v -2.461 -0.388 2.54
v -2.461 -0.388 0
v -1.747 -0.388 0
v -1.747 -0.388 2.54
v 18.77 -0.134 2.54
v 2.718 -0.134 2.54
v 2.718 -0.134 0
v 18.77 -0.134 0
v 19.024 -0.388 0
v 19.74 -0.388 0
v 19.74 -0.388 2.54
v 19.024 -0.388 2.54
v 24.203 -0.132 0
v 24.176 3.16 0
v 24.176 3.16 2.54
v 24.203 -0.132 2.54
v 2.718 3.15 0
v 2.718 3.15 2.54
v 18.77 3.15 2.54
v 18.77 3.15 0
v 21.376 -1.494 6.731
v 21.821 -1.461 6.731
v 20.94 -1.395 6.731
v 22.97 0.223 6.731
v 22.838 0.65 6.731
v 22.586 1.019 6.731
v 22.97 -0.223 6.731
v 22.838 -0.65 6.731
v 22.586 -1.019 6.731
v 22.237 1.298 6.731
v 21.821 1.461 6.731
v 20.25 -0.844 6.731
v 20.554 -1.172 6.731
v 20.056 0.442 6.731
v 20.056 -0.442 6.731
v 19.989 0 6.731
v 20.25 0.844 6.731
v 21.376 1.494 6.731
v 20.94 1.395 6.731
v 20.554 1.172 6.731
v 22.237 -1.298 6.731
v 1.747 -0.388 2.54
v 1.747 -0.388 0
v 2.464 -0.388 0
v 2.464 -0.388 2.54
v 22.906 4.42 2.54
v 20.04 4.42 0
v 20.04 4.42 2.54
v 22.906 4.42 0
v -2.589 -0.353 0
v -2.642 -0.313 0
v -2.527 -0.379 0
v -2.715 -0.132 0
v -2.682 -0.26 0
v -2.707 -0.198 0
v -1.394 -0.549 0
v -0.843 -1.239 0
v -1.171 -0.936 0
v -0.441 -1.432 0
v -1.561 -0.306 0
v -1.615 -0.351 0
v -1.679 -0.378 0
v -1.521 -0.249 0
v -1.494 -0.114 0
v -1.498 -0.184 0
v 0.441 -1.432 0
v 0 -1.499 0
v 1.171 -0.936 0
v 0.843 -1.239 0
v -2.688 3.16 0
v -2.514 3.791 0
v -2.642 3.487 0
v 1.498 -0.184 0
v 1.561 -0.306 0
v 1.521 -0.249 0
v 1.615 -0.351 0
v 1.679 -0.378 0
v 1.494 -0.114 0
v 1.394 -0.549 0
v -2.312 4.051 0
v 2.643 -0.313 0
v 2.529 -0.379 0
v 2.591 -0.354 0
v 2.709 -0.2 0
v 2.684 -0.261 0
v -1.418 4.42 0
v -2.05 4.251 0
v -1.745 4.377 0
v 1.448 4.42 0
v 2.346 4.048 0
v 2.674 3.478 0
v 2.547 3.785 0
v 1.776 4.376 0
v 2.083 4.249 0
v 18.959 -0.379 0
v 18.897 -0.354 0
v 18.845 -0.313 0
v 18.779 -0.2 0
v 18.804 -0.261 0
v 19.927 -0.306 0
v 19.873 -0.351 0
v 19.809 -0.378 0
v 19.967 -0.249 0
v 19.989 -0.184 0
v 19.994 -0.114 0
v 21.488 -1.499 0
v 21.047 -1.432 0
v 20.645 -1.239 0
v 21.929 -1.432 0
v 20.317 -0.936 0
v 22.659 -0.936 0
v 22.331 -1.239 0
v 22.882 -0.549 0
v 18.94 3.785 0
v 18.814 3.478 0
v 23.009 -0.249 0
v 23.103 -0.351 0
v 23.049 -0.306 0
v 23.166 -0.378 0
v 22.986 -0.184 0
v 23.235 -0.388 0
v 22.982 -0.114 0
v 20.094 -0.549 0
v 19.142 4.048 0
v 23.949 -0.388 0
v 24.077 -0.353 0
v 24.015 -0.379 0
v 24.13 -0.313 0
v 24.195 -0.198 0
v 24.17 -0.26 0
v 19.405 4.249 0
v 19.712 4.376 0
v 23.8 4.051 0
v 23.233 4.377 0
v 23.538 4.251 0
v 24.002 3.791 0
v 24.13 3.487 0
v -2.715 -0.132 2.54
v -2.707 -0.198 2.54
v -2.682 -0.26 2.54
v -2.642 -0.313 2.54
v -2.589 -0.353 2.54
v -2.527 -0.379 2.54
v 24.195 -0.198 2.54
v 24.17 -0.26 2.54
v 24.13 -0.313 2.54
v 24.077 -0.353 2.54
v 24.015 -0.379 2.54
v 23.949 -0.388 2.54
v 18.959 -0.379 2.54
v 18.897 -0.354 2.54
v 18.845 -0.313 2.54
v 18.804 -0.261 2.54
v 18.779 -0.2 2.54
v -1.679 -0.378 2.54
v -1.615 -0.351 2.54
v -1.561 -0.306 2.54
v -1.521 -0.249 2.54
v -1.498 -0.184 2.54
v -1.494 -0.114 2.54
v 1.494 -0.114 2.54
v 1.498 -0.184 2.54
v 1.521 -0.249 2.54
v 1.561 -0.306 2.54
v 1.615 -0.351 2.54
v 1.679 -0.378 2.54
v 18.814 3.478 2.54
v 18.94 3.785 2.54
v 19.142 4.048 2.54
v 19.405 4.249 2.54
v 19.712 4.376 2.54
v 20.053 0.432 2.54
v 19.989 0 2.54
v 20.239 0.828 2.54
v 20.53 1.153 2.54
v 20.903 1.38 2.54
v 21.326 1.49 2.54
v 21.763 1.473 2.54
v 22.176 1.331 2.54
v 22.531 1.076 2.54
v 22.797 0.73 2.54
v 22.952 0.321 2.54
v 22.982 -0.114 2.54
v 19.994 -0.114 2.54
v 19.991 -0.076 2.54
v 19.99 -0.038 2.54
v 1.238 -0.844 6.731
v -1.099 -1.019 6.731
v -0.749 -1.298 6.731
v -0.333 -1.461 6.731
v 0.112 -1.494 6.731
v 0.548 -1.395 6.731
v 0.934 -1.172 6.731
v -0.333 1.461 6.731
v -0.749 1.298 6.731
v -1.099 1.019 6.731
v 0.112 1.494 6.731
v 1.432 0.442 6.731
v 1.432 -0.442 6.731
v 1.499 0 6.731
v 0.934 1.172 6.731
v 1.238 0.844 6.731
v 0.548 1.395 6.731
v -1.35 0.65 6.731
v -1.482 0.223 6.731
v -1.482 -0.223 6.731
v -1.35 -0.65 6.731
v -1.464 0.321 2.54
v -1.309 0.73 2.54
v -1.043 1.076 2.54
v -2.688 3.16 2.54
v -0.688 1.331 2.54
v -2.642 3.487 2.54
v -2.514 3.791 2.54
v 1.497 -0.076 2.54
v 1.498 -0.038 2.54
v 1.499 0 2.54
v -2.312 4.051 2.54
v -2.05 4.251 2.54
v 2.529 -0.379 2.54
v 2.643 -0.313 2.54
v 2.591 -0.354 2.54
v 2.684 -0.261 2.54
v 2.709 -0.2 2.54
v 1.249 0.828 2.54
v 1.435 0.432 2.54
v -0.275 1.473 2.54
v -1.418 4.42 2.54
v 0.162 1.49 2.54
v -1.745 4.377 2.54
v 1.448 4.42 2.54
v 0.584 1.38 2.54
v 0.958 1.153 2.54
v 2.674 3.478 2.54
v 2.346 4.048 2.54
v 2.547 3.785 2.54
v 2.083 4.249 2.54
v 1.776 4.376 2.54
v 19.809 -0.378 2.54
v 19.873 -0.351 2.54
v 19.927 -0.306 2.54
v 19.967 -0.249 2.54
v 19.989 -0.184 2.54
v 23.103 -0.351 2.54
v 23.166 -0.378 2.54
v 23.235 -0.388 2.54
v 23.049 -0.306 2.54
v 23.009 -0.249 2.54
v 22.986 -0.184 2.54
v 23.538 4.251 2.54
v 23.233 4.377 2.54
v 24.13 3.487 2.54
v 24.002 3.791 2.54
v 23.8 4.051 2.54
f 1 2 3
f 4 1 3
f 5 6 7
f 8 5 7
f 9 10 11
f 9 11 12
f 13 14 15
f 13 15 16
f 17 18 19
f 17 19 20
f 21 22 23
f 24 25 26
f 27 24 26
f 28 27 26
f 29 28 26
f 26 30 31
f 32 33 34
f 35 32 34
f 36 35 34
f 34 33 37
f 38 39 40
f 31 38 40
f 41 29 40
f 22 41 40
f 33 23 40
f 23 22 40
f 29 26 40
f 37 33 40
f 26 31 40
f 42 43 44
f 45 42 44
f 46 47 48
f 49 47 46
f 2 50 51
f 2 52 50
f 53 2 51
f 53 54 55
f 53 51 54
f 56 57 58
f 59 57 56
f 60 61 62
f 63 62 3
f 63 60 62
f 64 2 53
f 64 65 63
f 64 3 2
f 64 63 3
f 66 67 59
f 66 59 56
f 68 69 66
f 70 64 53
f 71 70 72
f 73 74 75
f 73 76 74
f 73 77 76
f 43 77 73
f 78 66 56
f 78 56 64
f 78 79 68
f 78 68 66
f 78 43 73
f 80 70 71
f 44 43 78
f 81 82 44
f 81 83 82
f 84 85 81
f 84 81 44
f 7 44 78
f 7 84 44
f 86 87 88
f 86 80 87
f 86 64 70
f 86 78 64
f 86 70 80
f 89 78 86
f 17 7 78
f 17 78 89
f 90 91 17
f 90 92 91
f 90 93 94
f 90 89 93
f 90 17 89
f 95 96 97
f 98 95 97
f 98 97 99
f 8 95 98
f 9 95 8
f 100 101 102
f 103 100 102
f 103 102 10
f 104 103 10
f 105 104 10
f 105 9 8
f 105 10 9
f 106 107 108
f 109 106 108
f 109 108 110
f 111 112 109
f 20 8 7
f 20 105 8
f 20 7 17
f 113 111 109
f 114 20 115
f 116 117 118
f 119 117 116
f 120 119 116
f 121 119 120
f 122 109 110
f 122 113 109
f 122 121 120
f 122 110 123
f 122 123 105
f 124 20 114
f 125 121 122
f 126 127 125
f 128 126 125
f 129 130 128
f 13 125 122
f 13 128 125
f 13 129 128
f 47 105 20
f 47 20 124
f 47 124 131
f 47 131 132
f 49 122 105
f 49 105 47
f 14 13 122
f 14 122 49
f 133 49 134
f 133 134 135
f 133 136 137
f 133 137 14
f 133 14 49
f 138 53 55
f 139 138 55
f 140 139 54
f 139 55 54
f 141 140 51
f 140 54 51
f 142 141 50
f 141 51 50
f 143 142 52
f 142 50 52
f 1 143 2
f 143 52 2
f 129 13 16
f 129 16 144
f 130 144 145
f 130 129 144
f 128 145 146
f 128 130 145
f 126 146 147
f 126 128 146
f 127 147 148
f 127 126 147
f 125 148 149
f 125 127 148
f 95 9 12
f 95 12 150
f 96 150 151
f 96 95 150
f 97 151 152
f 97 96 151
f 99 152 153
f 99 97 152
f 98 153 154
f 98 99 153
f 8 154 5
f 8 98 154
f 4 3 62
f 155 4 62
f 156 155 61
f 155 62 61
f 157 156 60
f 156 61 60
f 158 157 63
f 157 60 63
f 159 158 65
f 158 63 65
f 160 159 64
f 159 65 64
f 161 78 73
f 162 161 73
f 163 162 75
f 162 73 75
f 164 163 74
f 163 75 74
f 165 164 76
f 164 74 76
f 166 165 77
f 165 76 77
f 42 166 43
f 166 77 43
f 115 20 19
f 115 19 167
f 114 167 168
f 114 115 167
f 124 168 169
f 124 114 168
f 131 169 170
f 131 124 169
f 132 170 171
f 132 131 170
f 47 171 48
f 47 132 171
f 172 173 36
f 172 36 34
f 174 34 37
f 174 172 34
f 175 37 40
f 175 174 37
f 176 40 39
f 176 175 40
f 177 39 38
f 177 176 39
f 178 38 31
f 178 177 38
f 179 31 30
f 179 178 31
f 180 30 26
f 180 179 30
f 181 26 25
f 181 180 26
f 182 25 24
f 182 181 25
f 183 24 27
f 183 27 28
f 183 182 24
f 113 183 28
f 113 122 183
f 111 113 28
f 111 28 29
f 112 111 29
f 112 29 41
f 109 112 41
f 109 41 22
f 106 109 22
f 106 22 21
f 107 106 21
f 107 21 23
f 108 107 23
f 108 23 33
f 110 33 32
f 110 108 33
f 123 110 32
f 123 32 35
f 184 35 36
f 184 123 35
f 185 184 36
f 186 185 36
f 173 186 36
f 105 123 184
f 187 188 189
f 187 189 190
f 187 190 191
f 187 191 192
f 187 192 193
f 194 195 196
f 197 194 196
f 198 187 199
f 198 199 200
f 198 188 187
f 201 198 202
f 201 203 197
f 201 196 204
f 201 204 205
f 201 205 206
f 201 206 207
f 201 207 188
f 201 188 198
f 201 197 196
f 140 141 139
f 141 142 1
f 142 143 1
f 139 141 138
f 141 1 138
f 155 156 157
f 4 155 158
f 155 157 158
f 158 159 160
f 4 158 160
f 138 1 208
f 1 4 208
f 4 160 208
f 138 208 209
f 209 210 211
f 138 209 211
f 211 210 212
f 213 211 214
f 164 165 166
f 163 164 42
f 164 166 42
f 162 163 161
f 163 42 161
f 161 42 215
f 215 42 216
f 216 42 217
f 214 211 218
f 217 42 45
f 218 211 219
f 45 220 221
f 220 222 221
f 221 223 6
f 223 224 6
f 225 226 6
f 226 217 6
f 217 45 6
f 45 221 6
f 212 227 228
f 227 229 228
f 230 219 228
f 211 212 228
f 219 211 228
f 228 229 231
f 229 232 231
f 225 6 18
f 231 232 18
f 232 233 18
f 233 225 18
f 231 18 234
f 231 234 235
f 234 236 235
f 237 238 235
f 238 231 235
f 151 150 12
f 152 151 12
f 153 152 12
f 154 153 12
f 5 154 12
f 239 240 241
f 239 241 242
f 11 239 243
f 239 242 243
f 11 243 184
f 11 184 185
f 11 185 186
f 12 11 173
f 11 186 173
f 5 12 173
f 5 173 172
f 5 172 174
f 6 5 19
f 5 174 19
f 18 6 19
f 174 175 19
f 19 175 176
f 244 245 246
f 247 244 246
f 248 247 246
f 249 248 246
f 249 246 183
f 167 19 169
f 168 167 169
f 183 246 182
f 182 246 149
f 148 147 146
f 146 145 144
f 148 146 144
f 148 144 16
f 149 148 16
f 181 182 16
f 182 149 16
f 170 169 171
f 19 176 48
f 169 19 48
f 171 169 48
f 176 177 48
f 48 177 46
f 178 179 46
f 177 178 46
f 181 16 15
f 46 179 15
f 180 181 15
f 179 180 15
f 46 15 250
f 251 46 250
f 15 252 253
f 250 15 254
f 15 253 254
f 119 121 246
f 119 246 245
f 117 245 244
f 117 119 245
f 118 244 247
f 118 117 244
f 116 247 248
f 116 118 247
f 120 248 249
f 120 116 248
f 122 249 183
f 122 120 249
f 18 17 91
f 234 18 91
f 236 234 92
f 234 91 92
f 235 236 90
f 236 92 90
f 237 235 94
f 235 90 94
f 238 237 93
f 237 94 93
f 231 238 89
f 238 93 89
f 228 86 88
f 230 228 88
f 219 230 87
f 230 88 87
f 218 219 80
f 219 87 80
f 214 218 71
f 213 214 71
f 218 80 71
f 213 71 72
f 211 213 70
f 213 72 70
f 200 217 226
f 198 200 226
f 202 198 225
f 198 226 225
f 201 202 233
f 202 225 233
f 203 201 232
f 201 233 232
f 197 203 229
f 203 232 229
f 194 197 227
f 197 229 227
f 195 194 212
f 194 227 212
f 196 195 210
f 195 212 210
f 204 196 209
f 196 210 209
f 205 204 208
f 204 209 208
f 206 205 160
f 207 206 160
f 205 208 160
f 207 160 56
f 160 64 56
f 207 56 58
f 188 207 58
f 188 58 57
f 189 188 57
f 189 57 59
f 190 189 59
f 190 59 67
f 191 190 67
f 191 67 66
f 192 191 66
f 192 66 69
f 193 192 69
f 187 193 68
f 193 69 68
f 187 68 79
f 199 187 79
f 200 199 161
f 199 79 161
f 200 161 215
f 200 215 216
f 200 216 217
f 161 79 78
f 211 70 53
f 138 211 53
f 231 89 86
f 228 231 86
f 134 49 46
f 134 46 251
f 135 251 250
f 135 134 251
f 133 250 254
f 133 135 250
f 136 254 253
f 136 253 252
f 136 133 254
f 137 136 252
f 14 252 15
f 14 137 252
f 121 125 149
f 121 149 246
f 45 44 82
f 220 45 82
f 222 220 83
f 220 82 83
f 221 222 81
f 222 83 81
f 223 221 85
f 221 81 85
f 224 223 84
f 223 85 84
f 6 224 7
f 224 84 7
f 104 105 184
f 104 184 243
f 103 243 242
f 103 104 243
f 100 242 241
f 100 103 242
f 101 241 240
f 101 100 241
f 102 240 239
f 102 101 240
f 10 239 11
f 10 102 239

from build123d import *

# Parameters (mm, degrees)
SKETCH1_R           = 1.4986
BOSS_EXTRUDE1_DEPTH = 6.731
BOSS_EXTRUDE2_DEPTH = 2.54
SKETCH3_W           = 2.54
SKETCH3_H           = 3.283466221
BOSS_EXTRUDE3_DEPTH = 8.0264


with BuildPart() as part:
    # Sketch1 → Boss-Extrude1 (new body)
    with BuildSketch(Plane.XY):
        Circle(SKETCH1_R)
    extrude(amount=BOSS_EXTRUDE1_DEPTH)

    # Sketch2 → Boss-Extrude2 (add)
    with BuildSketch(Plane(origin=(0, 0, 0), x_dir=(-1, 0, 0), z_dir=(0, 0, -1))):
        with BuildLine():
            Line((-1.74748007, -0.387866221), (-2.463536443, -0.387866221))
            ThreePointArc((-2.463536443, -0.387866221), (-2.643141566, -0.313471343), (-2.717536443, -0.133866221))
            Line((-2.717536443, -0.133866221), (-2.717536443, 3.1496))
            ThreePointArc((-2.717536443, 3.1496), (-2.345562055, 4.047625612), (-1.447536443, 4.4196))
            Line((-1.447536443, 4.4196), (1.417916008, 4.4196))
            ThreePointArc((1.417916008, 4.4196), (2.312179766, 4.051371774), (2.687871622, 3.160217845))
            Line((2.687871622, 3.160217845), (2.715395045, -0.131742652))
            ThreePointArc((2.715395045, -0.131742652), (2.641758277, -0.312718973), (2.461403923, -0.387866221))
            Line((2.461403923, -0.387866221), (1.74748007, -0.387866221))
            ThreePointArc((1.74748007, -0.387866221), (1.561141898, -0.306475854), (1.494222089, -0.114465319))
            ThreePointArc((1.494222089, -0.114465319), (0, 1.4986), (-1.494222089, -0.114465319))
            ThreePointArc((-1.494222089, -0.114465319), (-1.561141898, -0.306475854), (-1.74748007, -0.387866221))
        make_face()
    extrude(amount=-BOSS_EXTRUDE2_DEPTH)

    # Sketch3 → Boss-Extrude3 (add)
    with BuildSketch(Plane(origin=(2.717536443, 0, 0), x_dir=(0, 0, -1), z_dir=(1, 0, 0))):
        with Locations((-1.27, 1.50786689)):
            Rectangle(SKETCH3_W, SKETCH3_H)
    extrude(amount=BOSS_EXTRUDE3_DEPTH)

    # Mirror4: part across plane


with BuildPart() as part_1:
    add(part.part)
    add(part.part.mirror(Plane(origin=(10.743936443, 0, 0), x_dir=(0, 0, 1), z_dir=(1, 0, 0))))


solid = part_1.part
